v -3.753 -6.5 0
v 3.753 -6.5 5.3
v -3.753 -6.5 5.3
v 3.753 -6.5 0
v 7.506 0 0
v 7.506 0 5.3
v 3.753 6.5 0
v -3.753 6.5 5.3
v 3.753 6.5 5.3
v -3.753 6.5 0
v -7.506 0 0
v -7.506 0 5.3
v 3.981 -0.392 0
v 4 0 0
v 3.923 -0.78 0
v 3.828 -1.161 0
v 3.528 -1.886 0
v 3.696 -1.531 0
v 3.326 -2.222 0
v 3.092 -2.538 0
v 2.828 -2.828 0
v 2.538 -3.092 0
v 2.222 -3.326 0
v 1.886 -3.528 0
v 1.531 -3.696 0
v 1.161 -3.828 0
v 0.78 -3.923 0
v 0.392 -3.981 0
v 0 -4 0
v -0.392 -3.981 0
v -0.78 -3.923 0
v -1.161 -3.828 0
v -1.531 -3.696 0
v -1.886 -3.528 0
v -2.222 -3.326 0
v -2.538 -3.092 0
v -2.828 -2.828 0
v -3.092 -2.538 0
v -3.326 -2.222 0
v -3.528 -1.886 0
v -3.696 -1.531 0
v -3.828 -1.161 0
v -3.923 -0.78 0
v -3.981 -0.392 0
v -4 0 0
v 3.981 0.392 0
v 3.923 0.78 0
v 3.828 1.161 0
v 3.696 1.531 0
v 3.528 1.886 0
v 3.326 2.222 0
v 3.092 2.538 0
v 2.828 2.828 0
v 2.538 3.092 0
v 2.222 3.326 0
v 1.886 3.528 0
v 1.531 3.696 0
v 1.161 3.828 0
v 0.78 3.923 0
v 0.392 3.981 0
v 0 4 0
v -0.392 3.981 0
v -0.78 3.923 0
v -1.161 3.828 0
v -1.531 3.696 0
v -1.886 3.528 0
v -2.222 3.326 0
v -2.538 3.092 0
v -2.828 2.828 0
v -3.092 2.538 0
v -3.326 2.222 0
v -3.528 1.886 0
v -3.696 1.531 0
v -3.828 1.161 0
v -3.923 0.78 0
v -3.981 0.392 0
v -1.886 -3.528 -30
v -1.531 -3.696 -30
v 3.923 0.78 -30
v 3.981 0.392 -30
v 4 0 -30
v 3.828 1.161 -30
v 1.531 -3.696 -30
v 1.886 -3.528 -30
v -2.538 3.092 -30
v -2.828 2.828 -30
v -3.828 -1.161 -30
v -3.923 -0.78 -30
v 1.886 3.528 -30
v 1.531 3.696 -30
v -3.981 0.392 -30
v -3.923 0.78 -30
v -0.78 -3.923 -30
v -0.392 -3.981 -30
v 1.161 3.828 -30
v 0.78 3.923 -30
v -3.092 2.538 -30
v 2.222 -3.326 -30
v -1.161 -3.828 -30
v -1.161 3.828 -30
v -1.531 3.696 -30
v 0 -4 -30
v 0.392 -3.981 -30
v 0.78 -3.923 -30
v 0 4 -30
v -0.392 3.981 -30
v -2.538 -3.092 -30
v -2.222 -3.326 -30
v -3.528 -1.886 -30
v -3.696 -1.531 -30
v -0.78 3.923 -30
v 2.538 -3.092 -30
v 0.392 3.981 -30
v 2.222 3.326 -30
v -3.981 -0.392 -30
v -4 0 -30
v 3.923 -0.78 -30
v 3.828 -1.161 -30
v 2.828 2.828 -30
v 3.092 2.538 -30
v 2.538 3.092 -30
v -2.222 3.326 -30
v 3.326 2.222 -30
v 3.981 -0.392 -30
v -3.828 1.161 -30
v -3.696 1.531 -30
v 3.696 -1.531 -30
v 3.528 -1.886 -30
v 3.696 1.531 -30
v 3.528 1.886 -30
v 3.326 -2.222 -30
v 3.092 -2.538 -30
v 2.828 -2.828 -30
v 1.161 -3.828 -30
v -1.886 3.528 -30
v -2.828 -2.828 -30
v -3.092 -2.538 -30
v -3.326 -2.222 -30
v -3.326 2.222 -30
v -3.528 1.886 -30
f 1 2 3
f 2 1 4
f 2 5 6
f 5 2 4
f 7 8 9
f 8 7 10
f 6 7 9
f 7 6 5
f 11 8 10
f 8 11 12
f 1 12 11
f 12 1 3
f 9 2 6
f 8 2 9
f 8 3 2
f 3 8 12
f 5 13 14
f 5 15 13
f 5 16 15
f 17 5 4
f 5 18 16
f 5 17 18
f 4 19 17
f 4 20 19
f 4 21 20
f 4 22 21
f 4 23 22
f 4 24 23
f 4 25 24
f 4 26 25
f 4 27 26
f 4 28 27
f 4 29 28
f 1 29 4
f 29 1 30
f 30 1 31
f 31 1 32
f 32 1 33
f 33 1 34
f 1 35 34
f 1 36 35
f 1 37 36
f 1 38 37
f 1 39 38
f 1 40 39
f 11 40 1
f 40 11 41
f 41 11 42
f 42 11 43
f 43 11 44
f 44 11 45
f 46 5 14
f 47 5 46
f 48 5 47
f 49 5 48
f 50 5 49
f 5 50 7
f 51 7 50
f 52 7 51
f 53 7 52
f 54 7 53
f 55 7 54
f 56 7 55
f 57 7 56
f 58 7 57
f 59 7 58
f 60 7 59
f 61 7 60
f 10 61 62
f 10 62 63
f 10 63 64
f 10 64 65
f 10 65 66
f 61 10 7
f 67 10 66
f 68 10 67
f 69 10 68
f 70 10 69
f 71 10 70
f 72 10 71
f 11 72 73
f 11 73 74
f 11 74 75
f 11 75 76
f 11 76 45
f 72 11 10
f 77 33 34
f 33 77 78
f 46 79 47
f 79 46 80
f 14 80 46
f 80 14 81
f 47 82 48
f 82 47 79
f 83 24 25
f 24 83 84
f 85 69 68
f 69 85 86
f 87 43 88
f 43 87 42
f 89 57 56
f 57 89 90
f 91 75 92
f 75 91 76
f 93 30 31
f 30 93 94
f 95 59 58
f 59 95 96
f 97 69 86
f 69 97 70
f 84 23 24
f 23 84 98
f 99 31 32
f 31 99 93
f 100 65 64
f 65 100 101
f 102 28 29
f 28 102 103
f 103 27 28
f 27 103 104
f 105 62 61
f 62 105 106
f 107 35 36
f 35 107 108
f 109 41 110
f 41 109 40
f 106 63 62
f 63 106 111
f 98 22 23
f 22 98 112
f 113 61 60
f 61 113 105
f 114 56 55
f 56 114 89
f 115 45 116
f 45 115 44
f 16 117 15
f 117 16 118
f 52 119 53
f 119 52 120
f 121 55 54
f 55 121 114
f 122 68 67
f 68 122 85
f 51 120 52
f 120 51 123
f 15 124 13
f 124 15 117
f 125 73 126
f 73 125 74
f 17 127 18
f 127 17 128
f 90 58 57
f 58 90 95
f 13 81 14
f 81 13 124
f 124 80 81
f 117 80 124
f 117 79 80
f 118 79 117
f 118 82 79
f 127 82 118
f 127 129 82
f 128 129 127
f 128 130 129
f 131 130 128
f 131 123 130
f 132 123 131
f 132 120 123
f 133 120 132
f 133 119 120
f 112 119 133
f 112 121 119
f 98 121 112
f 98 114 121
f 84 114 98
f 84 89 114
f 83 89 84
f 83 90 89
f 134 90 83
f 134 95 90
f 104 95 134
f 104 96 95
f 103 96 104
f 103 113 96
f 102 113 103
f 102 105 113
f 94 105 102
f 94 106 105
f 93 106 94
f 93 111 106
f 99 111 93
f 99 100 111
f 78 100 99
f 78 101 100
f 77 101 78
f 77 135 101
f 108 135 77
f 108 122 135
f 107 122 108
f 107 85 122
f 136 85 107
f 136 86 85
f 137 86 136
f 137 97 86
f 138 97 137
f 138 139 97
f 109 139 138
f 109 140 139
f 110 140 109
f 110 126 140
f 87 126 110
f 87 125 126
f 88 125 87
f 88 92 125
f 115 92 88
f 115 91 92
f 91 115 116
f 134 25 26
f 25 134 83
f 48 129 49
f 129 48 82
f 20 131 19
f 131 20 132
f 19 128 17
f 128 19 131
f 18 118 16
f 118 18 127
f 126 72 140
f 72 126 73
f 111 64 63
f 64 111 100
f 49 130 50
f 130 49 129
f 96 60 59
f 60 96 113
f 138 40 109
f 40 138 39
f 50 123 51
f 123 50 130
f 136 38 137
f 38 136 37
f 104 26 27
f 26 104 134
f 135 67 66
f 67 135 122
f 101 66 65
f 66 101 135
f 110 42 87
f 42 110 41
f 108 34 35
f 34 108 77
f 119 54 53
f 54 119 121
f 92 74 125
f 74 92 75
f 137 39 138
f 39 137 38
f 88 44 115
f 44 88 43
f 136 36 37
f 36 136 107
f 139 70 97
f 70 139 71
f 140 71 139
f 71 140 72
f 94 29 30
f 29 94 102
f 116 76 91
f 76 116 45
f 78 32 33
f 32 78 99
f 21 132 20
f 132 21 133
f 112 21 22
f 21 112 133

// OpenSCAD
// M8 hex bolt (simplified, no threads)
// Units: mm

$fn = 64;

head_af = 13;      // across flats
head_h  = 5.3;     // head height
shank_d = 8;       // shank diameter
shank_l = 30;      // shank length

head_r = head_af / sqrt(3); // circumradius for regular hex from across-flats

union() {
    // Hex head: bottom face at z=0, extending +Z
    cylinder(h = head_h, r = head_r, $fn = 6);

    // Shank: from z=0 down to z=-30
    translate([0, 0, -shank_l])
        cylinder(h = shank_l, d = shank_d);
}
